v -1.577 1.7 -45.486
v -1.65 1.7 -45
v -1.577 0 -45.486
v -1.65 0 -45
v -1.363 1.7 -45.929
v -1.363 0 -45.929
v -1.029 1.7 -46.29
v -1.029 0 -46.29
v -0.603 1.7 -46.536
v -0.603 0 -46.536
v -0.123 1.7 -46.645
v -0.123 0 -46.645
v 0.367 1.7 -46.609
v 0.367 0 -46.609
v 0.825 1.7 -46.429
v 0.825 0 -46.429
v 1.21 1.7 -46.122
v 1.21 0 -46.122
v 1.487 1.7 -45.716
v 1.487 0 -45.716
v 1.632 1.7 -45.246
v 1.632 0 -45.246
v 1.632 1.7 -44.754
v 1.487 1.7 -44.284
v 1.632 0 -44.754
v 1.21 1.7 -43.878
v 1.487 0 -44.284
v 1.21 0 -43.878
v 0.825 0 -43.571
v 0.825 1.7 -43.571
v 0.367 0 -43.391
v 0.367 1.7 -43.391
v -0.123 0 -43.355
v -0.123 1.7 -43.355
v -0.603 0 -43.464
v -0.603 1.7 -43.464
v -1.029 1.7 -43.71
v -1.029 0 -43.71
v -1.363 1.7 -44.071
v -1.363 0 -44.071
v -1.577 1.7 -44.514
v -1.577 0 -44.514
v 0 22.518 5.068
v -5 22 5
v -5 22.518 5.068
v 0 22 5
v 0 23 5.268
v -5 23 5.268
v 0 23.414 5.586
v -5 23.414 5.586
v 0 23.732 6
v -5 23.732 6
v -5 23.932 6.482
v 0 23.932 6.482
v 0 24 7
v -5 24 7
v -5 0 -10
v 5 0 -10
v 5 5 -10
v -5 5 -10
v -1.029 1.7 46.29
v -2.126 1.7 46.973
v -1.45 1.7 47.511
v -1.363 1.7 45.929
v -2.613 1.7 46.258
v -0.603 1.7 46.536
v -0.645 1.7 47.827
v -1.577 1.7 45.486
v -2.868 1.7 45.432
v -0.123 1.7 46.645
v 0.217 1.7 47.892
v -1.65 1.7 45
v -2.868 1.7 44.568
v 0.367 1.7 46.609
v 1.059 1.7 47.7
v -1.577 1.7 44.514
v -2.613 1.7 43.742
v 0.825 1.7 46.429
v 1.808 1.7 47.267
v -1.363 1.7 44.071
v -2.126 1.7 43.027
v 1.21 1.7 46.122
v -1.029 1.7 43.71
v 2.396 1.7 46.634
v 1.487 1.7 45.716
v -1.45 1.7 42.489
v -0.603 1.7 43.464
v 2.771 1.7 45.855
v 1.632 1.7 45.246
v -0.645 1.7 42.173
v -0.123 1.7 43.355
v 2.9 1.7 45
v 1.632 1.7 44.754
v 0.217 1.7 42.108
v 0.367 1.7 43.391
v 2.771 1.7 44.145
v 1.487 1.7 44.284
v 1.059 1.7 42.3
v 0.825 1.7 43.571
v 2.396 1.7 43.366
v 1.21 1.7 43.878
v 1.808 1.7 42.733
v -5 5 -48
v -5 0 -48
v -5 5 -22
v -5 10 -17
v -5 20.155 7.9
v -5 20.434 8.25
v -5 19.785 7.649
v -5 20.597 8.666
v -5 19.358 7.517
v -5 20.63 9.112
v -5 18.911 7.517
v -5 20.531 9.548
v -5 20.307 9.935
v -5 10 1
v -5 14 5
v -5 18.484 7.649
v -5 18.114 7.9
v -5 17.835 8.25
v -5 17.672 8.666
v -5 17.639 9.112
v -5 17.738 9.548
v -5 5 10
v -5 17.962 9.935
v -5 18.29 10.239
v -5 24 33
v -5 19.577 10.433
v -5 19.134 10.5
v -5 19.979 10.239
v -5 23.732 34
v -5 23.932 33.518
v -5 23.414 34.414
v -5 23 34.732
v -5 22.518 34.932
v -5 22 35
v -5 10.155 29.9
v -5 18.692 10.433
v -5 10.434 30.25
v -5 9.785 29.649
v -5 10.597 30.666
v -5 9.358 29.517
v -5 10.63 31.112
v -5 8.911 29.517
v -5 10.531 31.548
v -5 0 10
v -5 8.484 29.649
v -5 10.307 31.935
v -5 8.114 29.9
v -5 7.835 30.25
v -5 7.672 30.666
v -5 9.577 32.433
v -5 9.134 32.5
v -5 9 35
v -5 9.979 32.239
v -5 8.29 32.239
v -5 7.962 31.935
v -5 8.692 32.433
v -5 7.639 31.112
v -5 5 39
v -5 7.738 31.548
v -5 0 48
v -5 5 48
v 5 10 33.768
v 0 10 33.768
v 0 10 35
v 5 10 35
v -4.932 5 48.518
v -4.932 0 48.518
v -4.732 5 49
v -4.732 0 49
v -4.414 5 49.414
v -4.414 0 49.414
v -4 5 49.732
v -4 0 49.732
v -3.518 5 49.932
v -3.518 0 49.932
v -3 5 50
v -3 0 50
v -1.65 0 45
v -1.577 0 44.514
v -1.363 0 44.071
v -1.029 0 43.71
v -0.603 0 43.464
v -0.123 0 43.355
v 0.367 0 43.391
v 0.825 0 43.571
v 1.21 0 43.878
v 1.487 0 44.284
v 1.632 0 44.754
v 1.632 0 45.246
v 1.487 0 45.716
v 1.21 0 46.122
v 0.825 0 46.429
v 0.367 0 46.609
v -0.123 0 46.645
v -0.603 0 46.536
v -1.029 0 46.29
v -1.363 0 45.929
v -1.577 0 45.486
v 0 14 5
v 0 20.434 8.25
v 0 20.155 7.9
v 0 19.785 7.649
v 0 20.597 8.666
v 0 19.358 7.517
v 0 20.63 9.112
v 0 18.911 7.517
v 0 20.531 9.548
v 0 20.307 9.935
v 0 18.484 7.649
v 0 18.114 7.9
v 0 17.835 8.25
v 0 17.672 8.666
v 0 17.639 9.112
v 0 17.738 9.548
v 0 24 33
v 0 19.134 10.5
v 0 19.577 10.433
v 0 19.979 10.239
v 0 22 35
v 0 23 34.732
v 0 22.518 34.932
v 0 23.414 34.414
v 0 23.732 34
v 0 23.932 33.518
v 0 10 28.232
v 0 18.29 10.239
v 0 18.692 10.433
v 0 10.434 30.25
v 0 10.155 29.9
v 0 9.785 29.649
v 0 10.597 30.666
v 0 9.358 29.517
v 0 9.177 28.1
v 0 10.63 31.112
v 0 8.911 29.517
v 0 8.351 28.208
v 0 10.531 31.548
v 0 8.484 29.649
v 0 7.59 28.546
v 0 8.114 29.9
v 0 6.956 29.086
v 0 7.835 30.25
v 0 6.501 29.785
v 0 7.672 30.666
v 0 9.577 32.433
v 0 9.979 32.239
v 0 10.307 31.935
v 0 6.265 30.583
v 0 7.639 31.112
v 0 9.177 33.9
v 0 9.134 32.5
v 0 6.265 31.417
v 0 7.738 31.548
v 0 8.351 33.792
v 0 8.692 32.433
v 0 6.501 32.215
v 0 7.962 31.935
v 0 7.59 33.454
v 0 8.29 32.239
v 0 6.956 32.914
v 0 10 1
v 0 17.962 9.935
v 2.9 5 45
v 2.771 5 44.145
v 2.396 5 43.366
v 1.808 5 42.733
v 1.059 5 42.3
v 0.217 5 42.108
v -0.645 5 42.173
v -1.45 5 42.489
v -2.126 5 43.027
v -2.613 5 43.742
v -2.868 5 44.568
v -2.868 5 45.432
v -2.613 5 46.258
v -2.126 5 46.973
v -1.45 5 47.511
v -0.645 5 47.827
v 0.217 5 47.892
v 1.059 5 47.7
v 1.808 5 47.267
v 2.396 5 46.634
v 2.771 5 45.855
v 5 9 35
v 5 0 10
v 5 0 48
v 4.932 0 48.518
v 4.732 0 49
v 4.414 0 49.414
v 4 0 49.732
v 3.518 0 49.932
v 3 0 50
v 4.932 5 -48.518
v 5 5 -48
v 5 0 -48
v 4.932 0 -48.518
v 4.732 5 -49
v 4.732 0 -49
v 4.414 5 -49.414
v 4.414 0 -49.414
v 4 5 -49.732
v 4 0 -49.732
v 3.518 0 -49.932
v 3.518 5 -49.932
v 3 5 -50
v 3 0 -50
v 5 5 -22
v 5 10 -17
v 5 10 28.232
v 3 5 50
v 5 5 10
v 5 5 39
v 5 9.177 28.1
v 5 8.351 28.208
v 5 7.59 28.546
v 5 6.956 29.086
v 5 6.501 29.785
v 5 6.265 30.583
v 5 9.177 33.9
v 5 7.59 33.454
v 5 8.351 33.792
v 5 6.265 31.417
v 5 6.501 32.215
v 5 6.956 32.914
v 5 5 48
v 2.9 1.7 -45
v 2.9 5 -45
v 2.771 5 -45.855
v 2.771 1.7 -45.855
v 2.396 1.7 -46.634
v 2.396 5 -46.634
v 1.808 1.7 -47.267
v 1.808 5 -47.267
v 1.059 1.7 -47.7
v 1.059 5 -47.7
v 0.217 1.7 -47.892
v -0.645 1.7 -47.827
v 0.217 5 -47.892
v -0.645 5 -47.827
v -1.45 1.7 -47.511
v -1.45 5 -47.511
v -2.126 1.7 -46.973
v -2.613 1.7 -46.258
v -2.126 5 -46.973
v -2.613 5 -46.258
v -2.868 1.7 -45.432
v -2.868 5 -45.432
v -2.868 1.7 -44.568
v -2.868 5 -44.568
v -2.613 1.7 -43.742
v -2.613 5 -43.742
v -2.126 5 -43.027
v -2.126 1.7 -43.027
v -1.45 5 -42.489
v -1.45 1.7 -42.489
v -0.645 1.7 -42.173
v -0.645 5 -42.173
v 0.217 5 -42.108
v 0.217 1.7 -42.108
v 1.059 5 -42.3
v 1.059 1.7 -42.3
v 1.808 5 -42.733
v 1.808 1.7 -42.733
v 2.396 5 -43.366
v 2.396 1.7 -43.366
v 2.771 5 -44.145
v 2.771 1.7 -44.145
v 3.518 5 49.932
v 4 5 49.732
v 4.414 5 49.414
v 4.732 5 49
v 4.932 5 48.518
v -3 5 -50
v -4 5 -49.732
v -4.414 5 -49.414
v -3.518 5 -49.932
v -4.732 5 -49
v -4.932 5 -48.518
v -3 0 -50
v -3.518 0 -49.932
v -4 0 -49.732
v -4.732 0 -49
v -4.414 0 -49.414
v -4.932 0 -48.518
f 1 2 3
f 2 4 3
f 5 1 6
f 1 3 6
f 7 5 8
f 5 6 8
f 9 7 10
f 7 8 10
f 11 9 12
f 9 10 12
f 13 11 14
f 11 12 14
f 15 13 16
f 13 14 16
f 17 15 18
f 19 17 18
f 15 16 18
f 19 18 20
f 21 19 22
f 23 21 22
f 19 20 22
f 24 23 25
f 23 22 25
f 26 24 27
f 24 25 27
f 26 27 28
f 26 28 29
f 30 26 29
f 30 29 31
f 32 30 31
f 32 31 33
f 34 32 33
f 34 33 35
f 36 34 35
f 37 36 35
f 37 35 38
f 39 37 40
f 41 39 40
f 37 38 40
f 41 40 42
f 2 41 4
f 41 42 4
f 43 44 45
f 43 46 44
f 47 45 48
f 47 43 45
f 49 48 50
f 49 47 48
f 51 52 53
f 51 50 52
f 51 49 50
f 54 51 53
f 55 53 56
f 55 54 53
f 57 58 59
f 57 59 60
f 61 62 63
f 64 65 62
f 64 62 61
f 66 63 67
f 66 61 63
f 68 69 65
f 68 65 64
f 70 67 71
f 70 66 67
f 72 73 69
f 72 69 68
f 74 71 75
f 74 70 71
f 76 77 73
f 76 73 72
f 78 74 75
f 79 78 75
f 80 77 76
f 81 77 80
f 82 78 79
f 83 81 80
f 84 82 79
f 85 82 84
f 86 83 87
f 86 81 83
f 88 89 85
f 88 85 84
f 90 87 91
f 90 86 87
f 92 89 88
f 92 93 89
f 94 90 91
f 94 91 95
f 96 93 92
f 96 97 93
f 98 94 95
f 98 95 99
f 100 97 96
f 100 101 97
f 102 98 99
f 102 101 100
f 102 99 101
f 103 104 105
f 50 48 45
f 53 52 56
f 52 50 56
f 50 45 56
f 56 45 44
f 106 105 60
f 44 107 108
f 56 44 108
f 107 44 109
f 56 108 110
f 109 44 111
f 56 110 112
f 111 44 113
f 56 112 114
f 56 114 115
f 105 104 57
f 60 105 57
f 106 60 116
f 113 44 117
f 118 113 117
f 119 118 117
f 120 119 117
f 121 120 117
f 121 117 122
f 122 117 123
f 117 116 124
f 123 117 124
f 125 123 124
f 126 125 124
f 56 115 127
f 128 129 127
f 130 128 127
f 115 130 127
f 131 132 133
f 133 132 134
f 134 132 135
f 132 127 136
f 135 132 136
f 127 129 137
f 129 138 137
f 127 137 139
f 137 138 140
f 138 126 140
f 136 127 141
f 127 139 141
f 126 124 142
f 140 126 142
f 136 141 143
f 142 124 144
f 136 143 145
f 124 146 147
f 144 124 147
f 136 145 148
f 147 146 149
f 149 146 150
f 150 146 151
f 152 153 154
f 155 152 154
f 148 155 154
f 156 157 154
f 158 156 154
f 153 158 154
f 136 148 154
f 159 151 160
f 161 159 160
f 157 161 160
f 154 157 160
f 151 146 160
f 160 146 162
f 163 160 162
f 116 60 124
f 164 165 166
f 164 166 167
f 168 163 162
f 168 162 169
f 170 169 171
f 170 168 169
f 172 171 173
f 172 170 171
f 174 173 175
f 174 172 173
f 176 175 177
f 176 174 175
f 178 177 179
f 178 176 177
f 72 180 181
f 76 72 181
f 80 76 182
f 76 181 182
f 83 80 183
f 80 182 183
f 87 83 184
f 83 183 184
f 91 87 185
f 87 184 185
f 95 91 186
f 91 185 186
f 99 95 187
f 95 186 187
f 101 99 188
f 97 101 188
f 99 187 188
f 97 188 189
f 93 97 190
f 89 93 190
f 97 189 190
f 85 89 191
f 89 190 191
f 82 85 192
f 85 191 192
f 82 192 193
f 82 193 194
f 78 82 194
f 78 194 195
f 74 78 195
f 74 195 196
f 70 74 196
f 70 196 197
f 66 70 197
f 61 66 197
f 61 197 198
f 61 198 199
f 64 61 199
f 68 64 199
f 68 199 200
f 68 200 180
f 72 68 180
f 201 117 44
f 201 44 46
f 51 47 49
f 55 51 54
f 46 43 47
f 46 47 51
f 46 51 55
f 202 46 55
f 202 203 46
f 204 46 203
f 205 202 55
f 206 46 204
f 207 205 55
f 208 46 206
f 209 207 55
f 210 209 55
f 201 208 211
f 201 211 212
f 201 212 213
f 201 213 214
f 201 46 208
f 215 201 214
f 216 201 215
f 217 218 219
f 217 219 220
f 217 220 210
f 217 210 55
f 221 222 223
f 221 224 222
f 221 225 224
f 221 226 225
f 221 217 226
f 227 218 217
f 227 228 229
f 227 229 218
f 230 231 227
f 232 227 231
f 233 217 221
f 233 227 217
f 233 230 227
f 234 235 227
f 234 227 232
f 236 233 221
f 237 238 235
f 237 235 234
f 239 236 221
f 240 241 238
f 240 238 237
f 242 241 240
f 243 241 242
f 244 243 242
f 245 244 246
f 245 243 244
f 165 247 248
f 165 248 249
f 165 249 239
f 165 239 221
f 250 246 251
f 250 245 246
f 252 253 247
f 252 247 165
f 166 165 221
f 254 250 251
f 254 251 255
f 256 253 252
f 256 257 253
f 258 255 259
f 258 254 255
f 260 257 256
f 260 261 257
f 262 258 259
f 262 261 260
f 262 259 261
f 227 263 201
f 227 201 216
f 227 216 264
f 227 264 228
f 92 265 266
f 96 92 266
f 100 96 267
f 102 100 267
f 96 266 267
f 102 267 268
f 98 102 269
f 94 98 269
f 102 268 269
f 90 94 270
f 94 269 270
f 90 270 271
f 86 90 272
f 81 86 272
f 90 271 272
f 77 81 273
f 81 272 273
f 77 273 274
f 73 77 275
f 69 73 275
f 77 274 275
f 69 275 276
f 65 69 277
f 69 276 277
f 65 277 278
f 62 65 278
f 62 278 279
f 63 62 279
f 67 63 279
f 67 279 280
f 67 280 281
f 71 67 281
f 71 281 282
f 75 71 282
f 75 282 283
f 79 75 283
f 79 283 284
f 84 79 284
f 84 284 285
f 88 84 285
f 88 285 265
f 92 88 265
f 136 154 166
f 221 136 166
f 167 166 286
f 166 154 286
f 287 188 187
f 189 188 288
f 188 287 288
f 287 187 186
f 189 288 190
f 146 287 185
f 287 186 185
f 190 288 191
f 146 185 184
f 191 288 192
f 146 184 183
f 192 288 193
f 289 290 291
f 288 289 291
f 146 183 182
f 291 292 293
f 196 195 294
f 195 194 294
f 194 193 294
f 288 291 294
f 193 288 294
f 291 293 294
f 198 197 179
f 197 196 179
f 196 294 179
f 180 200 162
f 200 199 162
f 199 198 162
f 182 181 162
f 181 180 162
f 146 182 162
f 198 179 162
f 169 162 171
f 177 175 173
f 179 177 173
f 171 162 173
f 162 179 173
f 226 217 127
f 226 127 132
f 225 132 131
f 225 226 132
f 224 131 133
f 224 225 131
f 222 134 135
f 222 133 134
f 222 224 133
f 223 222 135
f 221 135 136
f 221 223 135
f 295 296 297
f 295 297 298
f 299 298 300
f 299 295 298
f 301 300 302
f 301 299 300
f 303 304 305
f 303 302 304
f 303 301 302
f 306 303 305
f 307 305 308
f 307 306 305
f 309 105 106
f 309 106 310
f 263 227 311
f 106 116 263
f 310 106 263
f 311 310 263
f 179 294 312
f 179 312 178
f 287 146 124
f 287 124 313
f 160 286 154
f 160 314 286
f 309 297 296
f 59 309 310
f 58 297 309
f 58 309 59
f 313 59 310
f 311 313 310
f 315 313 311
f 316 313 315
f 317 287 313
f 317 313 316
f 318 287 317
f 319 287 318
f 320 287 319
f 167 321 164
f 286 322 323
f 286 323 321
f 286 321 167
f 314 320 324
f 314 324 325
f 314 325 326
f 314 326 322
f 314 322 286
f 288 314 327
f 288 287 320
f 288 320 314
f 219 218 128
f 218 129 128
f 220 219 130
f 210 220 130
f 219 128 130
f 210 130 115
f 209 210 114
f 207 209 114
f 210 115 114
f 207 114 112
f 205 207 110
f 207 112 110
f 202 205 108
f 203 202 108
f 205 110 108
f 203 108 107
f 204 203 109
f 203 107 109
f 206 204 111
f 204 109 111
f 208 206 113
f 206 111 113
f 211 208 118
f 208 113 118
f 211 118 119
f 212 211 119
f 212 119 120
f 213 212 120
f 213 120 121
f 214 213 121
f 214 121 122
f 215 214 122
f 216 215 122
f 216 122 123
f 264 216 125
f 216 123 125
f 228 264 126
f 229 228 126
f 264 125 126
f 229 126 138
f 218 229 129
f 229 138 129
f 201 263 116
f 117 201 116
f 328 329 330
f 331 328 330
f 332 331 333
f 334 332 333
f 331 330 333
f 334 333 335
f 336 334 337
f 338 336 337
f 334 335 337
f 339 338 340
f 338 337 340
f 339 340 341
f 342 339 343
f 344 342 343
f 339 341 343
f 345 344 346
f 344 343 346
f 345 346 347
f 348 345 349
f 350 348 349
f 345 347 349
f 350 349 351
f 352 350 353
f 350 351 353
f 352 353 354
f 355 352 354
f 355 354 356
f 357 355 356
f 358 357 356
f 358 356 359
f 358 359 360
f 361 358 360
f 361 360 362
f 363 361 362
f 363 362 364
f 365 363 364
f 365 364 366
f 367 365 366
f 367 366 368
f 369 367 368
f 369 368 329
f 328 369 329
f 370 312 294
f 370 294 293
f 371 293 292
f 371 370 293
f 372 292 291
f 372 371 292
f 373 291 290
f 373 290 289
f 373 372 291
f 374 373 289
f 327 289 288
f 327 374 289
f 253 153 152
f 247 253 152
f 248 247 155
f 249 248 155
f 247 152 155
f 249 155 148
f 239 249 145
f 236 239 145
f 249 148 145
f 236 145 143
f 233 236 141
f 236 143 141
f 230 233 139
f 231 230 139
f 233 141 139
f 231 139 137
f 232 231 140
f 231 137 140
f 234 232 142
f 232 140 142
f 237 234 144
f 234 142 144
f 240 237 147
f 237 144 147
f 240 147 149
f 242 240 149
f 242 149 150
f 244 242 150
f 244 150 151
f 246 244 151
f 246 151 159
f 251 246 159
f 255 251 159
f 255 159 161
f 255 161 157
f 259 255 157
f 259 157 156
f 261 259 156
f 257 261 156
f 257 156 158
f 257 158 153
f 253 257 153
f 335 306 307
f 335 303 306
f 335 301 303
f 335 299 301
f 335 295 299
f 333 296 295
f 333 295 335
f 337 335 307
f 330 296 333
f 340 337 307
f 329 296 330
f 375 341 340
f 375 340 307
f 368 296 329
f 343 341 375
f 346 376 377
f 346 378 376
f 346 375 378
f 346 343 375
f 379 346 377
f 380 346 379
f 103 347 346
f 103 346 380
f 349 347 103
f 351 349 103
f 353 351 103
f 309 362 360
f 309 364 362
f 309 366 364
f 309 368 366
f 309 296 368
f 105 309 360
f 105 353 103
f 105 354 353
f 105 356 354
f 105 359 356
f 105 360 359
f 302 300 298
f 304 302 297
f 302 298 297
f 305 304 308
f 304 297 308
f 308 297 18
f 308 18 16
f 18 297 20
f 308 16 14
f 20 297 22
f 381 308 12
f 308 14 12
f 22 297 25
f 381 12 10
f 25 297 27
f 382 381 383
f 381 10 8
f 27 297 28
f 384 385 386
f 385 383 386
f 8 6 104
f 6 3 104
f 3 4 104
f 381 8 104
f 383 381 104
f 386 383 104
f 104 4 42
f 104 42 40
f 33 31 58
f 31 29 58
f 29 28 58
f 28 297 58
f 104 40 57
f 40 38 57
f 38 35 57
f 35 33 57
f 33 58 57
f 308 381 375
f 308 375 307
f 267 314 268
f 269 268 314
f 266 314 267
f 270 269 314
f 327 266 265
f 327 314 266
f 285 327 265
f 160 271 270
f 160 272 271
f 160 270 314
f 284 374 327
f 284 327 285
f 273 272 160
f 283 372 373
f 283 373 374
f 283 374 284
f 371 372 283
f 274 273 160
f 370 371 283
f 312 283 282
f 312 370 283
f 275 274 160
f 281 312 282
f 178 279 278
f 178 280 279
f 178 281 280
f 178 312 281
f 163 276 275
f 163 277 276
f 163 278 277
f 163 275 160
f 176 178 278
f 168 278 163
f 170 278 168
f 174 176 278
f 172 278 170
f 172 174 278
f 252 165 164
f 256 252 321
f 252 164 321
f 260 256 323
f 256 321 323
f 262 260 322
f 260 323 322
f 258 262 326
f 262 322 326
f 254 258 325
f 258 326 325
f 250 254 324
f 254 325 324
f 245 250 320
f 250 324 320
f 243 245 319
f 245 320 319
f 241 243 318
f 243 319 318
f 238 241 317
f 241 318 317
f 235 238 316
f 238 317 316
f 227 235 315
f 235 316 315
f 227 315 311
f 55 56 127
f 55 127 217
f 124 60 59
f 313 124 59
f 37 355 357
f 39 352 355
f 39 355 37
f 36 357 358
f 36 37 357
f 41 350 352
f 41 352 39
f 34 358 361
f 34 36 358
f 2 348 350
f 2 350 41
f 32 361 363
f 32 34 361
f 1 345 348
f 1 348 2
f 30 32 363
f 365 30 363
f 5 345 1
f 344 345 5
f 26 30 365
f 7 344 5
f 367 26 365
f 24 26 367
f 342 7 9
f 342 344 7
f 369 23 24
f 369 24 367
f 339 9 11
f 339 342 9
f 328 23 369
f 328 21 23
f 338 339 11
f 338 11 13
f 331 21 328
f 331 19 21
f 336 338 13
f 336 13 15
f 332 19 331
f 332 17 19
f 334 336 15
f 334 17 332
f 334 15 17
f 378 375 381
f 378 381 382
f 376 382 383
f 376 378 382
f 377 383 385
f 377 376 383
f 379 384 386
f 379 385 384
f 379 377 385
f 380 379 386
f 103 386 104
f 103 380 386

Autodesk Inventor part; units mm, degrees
ref_plane "YZ Plane" through (0, 0, 0) normal (1, 0, 0) x (0, 1, 0)
ref_plane "XZ Plane" through (0, 0, 0) normal (0, 1, 0) x (-1, 0, 0)
ref_plane "XY Plane" through (0, 0, 0) normal (0, 0, 1) x (1, 0, 0)
sketch "Sketch1" plane through (0, 0, 0) normal (0, 1, 0) x (-1, 0, 0)
  line L0 (-5, 50) -> (5, 50)
  line L1 (5, 50) -> (5, -50)
  line L2 (5, -50) -> (-5, -50)
  line L3 (-5, -50) -> (-5, 50)
  line L4 (-5, 50) -> (5, -50) construction
  line L5 (5, 50) -> (-5, -50) construction
  circle A0 centre (0, 45) radius 1.65
  circle A1 centre (0, -45) radius 1.65
  line L6 (0, 45) -> (0, -45) construction
  line L7 (-5, -10) -> (5, -10)
  line L8 (5, -10) -> (5, 10)
  line L9 (5, 10) -> (-5, 10)
  line L10 (-5, 10) -> (-5, -10)
  line L11 (-5, -10) -> (5, 10) construction
  line L12 (5, -10) -> (-5, 10) construction
  point P0 (0, 0)
  dimension "d0" = 90
  dimension "d1" = 5
  dimension "d2" = 3.3
  dimension "d3" = 10
  dimension "d4" = 20
extrude "Extrusion1" add sketch "Sketch1" along normal blind 5 contours L0 L1 L9 L3 | L7 L1 L2 L3
sketch "Sketch2" plane through (0, 5, 0) normal (0, 1, 0) x (1, 0, 0)
  line L0 (5, -50) -> (5, -10) projected
  line L1 (5, -10) -> (-5, -10) projected
  line L2 (-5, -10) -> (-5, -50) projected
  line L3 (-5, -50) -> (5, -50) projected
  circle A0 centre (0, -45) radius 1.65 projected
  line L4 (-5, 50) -> (-5, 10) projected
  line L5 (-5, 10) -> (5, 10) projected
  line L6 (5, 10) -> (5, 50) projected
  line L7 (5, 50) -> (-5, 50) projected
  circle A1 centre (0, 45) radius 1.65 projected
  line L8 (-5, -35) -> (5, -35)
  line L9 (5, -35) -> (5, 17)
  line L10 (5, 17) -> (-5, 17)
  line L11 (-5, 17) -> (-5, -35)
  point P0 (0, 0)
  point P1 (5, -35)
  point P2 (-5, 17)
  dimension "d7" = 52
  dimension "d26" = 7
extrude "Extrusion2" add sketch "Sketch2" along normal blind 5 contours L8 L2 L1 L0 | L1 L11 L5 L9 | L5 L4 L10 L6
sketch "Sketch3" plane through (0, 10, 0) normal (0, 1, 0) x (1, 0, 0)
  line L0 (5, -35) -> (5, 17) projected
  line L1 (5, 17) -> (-5, 17) projected
  line L2 (-5, 17) -> (-5, -35) projected
  line L3 (-5, -35) -> (5, -35) projected
  line L4 (-5, -5) -> (0, -5)
  line L5 (0, -5) -> (0, -35)
  line L6 (0, -35) -> (-5, -35)
  line L7 (-5, -35) -> (-5, -5)
  point P0 (0, 0)
  point P1 (-5, -35)
  point P2 (0, -35)
  dimension "d10" = 5
  dimension "d11" = 30
extrude "Extrusion3" add sketch "Sketch3" along normal blind 14 contours L3 L2 L4 L5
sketch "Sketch4" plane through (-5, 0, -50) normal (-1, 0, 0) x (0, 0, 1)
  line L0 (0, 0) -> (40, 0) projected
  line L1 (40, 0) -> (40, 5) projected
  line L2 (40, 5) -> (60, 5) projected
  line L3 (60, 0) -> (60, 5) projected
  line L4 (60, 0) -> (100, 0) projected
  line L5 (100, 0) -> (100, 5) projected
  line L6 (85, 5) -> (100, 5) projected
  line L7 (85, 5) -> (85, 24) projected
  line L8 (33, 10) -> (55, 10) projected
  line L9 (55, 24) -> (85, 24) projected
  line L10 (55, 10) -> (55, 24) projected
  line L11 (33, 5) -> (33, 10) projected
  line L12 (0, 5) -> (33, 5) projected
  line L13 (0, 0) -> (0, 5) projected
  line L14 (56, 6.1345) -> (84, 6.1345)
  line L15 (84, 6.1345) -> (84, 22.1345)
  line L16 (84, 22.1345) -> (56, 22.1345)
  line L17 (56, 22.1345) -> (56, 6.1345)
  circle A0 centre (59, 19.1345) radius 1.5
  circle A1 centre (81, 9.1345) radius 1.5
  line L18 (84, 6.1345) -> (81, 6.1345) construction
  line L19 (81, 6.1345) -> (81, 9.1345) construction
  line L20 (81, 9.1345) -> (84, 9.1345) construction
  line L21 (84, 9.1345) -> (84, 6.1345) construction
  line L22 (56, 22.1345) -> (59, 22.1345) construction
  line L23 (59, 22.1345) -> (59, 19.1345) construction
  line L24 (59, 19.1345) -> (56, 19.1345) construction
  line L25 (56, 19.1345) -> (56, 22.1345) construction
  point P0 (50, 0)
  point P1 (70, 22.1345)
  point P2 (70, 24)
  dimension "d14" = 28
  dimension "d15" = 16
  dimension "d18" = 3
  dimension "d19" = 3
  dimension "d22" = 3
  dimension "d23" = 3
  dimension "d24" = 3
  dimension "d25" = 3
extrude "Extrusion4" cut sketch "Sketch4" against normal through all contours A0 | A1
sketch "Sketch5" plane through (0, 5, 0) normal (0, 1, 0) x (1, 0, 0)
  circle A0 centre (0, 45) radius 1.65 projected
  line L0 (5, -35) -> (-5, -35) projected
  line L1 (-5, -35) -> (-5, -50) projected
  line L2 (-5, -50) -> (5, -50) projected
  line L3 (5, -50) -> (5, -35) projected
  circle A1 centre (0, -45) radius 1.65 projected
  line L4 (-5, 17) -> (5, 17) projected
  line L5 (5, 17) -> (5, 50) projected
  line L6 (5, 50) -> (-5, 50) projected
  line L7 (-5, 50) -> (-5, 17) projected
  circle A2 centre (0, 45) radius 1.65 projected
  circle A3 centre (0, 45) radius 2.9
  circle A4 centre (0, -45) radius 2.9
  point P0 (0, 0)
  dimension "d27" = 5.8
  dimension "d28" = 5.8
extrude "Extrusion5" cut sketch "Sketch5" against normal blind 3.3 contours A0 | A1 | A3 | A4
chamfer "Chamfer1" distance 4 angle 45 2 edges at (0, 5, 35) (-2.5, 10, 5)
fillet "Fillet1" radius 2 2 edges at (-2.5, 24, 35) (-2.5, 24, 5)
sketch "Sketch6" plane through (5, 0, 50) normal (1, 0, 0) x (0, 0, -1)
  arc A0 (17.7749, 10) -> (20.2251, 10) centre (19, 9.1345) ccw projected
  line L0 (15, 10) -> (17.7749, 10) projected
  line L1 (15, 9) -> (15, 10) projected
  line L2 (11, 5) -> (15, 9) projected
  line L3 (0, 5) -> (11, 5) projected
  line L4 (0, 0) -> (0, 5) projected
  line L5 (0, 0) -> (40, 0) projected
  line L6 (40, 0) -> (40, 5) projected
  line L7 (40, 5) -> (60, 5) projected
  line L8 (60, 0) -> (60, 5) projected
  line L9 (60, 0) -> (100, 0) projected
  line L10 (100, 0) -> (100, 5) projected
  line L11 (67, 5) -> (100, 5) projected
  line L12 (67, 5) -> (67, 10) projected
  line L13 (20.2251, 10) -> (67, 10) projected
  circle A1 centre (19, 9.1345) radius 2.9
  point P0 (50, 0)
  dimension "d35" = 5.8
extrude "Extrusion6" cut sketch "Sketch6" against normal up to surface (5 mm away) contours L0 A1 L13 A0 | A0 L13 A1 L0
chamfer "Chamfer2" distance 5 angle 45 1 edges at (0, 5, -17)
fillet "Fillet2" radius 2 4 edges at (-5, 2.5, 50) (5, 2.5, 50) (-5, 2.5, -50) (5, 2.5, -50)
properties part number "SOPORTE_FIN_CARRERA_INGRESO" material "Steel, Mild, Welded"
